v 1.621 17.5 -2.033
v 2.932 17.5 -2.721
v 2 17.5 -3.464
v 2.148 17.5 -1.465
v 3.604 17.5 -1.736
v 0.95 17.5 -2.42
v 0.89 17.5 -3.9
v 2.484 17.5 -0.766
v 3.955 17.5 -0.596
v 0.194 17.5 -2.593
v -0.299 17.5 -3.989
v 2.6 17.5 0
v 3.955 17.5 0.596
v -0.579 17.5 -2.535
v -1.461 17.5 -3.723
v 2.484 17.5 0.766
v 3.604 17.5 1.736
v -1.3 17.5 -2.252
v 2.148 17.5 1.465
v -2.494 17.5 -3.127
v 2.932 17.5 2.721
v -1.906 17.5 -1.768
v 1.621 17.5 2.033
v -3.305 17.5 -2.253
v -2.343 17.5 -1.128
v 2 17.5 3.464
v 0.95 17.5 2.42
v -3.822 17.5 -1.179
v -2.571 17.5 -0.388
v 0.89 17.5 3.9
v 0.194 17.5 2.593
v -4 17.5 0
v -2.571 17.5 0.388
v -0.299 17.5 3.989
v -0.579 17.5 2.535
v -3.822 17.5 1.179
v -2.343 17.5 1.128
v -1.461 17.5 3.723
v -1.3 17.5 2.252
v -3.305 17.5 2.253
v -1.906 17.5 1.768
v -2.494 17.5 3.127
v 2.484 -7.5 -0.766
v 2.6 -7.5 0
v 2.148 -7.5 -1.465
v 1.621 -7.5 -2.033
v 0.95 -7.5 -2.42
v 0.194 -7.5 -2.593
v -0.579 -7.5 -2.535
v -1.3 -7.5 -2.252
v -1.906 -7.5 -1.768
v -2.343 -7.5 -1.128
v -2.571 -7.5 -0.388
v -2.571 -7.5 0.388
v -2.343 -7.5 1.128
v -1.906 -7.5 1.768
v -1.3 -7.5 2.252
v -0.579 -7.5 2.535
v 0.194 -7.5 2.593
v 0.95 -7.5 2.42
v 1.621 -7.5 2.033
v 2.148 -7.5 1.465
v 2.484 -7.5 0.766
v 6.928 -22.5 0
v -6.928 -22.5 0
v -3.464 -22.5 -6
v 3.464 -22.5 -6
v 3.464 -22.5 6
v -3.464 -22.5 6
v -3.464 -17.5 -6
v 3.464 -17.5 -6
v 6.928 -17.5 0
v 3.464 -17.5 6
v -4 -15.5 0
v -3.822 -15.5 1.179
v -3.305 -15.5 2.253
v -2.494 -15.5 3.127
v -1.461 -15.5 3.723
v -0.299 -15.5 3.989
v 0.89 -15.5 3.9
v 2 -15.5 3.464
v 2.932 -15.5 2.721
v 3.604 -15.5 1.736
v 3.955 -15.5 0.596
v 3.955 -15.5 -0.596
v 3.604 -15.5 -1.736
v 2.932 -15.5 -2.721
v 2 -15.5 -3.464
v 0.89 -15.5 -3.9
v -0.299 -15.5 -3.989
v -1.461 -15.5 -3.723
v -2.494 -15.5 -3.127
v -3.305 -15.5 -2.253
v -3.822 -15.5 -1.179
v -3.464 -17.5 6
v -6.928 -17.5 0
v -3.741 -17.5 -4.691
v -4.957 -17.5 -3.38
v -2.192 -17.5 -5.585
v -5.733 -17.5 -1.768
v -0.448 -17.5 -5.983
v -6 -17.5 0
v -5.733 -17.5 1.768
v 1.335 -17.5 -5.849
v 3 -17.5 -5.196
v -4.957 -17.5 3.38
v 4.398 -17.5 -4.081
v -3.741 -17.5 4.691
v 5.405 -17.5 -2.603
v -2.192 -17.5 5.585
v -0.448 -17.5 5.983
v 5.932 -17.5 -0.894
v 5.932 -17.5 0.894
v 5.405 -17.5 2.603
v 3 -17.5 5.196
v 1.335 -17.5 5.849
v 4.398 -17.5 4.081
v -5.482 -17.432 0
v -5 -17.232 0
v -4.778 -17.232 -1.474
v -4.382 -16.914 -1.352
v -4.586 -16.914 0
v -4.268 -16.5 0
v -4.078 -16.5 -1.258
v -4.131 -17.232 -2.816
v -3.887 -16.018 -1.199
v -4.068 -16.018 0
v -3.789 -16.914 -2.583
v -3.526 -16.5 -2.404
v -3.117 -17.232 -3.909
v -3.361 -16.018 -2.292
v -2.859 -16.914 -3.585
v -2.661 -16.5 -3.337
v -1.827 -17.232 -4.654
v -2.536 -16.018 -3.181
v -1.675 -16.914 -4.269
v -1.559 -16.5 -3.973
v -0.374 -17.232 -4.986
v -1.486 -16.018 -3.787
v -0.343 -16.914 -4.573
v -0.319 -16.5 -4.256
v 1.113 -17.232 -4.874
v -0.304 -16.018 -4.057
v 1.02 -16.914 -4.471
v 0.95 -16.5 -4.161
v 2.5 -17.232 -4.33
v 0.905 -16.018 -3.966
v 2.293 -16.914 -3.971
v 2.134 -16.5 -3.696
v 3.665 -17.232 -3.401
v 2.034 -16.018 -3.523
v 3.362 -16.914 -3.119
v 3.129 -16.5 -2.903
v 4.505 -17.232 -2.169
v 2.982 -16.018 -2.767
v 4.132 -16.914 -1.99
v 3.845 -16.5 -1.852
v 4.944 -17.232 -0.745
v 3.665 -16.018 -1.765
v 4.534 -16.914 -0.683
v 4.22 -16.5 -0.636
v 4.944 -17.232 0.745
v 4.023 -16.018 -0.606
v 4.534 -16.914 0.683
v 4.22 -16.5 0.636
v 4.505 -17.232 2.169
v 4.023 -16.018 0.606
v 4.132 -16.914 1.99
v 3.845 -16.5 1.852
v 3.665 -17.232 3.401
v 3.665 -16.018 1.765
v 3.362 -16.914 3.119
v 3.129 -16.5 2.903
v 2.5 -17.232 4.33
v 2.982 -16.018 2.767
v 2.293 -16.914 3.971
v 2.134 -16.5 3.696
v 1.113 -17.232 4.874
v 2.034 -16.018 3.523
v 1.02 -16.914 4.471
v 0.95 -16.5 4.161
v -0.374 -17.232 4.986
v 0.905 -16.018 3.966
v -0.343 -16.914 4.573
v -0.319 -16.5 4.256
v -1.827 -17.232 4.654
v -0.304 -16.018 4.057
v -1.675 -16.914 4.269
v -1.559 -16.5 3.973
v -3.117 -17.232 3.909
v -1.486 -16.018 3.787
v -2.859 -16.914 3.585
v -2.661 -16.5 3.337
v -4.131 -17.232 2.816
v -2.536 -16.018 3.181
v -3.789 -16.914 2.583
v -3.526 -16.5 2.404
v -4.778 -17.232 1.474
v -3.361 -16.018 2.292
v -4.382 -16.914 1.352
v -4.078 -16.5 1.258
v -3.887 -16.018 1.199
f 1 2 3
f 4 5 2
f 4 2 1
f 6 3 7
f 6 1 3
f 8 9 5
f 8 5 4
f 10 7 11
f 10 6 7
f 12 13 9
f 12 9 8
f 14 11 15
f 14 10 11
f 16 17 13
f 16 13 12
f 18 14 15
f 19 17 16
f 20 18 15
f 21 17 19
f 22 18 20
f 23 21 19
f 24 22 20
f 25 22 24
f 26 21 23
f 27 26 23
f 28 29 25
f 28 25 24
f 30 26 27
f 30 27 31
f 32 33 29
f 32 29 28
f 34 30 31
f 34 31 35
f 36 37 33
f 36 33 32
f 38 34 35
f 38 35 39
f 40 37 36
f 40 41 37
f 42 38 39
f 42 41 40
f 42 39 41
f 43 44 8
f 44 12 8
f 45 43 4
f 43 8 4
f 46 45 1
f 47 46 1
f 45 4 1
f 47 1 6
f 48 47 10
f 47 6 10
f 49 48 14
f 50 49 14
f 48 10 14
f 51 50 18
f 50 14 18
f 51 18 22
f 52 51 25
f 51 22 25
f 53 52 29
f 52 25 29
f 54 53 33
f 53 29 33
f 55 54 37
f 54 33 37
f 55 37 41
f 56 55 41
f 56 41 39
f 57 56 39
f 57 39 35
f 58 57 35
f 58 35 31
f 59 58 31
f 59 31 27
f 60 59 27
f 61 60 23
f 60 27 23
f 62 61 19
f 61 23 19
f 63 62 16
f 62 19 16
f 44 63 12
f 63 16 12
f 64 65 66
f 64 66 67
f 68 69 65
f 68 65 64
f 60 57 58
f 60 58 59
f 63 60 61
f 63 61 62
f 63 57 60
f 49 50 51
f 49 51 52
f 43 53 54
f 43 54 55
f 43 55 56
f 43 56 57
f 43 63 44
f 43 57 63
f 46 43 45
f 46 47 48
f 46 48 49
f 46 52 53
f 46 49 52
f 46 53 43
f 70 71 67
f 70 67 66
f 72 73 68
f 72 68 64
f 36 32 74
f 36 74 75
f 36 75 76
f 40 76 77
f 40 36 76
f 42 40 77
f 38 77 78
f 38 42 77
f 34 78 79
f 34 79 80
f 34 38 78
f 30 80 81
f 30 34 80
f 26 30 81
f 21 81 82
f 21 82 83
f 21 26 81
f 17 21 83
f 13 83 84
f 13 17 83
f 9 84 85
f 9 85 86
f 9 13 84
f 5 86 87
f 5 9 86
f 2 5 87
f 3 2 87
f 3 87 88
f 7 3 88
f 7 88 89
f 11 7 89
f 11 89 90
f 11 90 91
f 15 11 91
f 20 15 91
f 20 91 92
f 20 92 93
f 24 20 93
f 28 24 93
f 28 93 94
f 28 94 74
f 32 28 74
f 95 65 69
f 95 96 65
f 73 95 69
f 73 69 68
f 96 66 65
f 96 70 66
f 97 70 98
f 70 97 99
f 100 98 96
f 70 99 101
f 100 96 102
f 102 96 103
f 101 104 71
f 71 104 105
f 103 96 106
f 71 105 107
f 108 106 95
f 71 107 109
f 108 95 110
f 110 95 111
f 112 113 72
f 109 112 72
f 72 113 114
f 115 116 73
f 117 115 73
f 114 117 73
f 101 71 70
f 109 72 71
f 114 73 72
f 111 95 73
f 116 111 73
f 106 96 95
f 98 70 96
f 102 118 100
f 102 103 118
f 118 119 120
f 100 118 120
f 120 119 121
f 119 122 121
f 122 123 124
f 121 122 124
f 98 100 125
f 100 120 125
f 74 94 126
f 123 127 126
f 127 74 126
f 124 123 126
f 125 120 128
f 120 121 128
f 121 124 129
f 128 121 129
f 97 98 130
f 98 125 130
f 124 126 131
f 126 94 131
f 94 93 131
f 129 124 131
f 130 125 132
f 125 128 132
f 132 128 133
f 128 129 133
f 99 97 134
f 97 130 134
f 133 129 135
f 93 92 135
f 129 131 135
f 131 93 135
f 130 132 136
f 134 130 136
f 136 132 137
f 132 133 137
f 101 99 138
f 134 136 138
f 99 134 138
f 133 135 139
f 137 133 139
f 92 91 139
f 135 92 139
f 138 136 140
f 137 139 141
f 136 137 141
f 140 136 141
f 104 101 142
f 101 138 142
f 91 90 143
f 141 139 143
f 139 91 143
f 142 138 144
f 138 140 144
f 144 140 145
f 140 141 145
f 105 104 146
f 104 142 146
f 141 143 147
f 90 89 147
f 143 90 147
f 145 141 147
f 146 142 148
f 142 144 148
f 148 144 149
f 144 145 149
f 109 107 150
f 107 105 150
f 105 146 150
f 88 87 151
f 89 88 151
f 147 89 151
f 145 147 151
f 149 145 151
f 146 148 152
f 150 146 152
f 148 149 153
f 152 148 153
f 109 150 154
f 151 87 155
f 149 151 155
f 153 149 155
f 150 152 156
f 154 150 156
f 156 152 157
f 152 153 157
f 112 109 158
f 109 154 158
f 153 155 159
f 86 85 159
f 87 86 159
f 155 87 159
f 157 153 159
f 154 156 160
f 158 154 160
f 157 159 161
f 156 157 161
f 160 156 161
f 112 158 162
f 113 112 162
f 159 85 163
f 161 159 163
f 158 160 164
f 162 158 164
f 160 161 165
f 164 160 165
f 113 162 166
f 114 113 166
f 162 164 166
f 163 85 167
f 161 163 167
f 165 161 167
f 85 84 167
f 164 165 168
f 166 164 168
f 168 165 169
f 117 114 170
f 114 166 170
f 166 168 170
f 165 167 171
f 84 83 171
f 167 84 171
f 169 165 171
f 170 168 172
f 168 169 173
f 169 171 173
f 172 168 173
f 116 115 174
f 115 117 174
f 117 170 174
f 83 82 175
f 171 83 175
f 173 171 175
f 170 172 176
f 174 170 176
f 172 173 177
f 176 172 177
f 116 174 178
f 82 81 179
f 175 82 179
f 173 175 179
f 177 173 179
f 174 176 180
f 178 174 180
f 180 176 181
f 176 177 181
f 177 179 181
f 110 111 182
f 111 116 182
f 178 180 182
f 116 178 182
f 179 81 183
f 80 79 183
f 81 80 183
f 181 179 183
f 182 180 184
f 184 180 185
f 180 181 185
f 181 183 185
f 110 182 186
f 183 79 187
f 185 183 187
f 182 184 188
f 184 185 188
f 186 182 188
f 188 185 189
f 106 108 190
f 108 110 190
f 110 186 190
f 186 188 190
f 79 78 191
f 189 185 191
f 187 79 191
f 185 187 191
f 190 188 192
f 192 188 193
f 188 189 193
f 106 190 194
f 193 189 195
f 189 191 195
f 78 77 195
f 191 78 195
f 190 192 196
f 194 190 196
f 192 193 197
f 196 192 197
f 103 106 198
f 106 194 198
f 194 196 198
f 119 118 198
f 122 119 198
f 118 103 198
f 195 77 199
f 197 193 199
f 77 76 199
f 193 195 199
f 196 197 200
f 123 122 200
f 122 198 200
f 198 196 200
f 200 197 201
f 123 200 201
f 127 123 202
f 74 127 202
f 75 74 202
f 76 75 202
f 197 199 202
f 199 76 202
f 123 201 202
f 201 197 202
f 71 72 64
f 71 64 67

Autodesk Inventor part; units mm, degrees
ref_plane "YZ Plane" through (0, 0, 0) normal (1, 0, 0) x (0, 1, 0)
ref_plane "XZ Plane" through (0, 0, 0) normal (0, 1, 0) x (-1, 0, 0)
ref_plane "XY Plane" through (0, 0, 0) normal (0, 0, 1) x (1, 0, 0)
sketch "Szkic1" plane through (0, 0, 0) normal (0, 1, 0) x (-1, 0, 0)
  circle A0 centre (0, 0) radius 4
  dimension "d0" = 8
extrude "Wyciągnięcie proste1" add sketch "Szkic1" along normal mid plane 35
sketch "Szkic2" plane through (0, 17.5, 0) normal (0, 1, 0) x (1, 0, 0)
  circle A0 centre (0, 0) radius 2.6
  dimension "d3" = 5.2
extrude "Wyciągnięcie proste2" cut sketch "Szkic2" against normal blind 25
thread "Gwint1" size "M5.5x0.5" class "6H" standard "ANSI Metric M Profile" length 25
sketch "Szkic3" plane through (0, -17.5, 0) normal (0, -1, 0) x (1, 0, 0)
  line L0 (3.4641, 6) -> (6.9282, 0)
  line L1 (6.9282, 0) -> (3.4641, -6)
  line L2 (3.4641, -6) -> (-3.4641, -6)
  line L3 (-3.4641, -6) -> (-6.9282, 0)
  line L4 (-6.9282, 0) -> (-3.4641, 6)
  line L5 (-3.4641, 6) -> (3.4641, 6)
  point P0 (0, 0)
  point P1 (0, 0)
  dimension "d8" = 6
  dimension "d10" = 6
extrude "Wyciągnięcie proste3" add sketch "Szkic3" along normal blind 5
fillet "Zaokrąglenie1" radius 2 1 edges at (4, -17.5, 0)
properties part number "zamkniecie_sworzenia_2"
